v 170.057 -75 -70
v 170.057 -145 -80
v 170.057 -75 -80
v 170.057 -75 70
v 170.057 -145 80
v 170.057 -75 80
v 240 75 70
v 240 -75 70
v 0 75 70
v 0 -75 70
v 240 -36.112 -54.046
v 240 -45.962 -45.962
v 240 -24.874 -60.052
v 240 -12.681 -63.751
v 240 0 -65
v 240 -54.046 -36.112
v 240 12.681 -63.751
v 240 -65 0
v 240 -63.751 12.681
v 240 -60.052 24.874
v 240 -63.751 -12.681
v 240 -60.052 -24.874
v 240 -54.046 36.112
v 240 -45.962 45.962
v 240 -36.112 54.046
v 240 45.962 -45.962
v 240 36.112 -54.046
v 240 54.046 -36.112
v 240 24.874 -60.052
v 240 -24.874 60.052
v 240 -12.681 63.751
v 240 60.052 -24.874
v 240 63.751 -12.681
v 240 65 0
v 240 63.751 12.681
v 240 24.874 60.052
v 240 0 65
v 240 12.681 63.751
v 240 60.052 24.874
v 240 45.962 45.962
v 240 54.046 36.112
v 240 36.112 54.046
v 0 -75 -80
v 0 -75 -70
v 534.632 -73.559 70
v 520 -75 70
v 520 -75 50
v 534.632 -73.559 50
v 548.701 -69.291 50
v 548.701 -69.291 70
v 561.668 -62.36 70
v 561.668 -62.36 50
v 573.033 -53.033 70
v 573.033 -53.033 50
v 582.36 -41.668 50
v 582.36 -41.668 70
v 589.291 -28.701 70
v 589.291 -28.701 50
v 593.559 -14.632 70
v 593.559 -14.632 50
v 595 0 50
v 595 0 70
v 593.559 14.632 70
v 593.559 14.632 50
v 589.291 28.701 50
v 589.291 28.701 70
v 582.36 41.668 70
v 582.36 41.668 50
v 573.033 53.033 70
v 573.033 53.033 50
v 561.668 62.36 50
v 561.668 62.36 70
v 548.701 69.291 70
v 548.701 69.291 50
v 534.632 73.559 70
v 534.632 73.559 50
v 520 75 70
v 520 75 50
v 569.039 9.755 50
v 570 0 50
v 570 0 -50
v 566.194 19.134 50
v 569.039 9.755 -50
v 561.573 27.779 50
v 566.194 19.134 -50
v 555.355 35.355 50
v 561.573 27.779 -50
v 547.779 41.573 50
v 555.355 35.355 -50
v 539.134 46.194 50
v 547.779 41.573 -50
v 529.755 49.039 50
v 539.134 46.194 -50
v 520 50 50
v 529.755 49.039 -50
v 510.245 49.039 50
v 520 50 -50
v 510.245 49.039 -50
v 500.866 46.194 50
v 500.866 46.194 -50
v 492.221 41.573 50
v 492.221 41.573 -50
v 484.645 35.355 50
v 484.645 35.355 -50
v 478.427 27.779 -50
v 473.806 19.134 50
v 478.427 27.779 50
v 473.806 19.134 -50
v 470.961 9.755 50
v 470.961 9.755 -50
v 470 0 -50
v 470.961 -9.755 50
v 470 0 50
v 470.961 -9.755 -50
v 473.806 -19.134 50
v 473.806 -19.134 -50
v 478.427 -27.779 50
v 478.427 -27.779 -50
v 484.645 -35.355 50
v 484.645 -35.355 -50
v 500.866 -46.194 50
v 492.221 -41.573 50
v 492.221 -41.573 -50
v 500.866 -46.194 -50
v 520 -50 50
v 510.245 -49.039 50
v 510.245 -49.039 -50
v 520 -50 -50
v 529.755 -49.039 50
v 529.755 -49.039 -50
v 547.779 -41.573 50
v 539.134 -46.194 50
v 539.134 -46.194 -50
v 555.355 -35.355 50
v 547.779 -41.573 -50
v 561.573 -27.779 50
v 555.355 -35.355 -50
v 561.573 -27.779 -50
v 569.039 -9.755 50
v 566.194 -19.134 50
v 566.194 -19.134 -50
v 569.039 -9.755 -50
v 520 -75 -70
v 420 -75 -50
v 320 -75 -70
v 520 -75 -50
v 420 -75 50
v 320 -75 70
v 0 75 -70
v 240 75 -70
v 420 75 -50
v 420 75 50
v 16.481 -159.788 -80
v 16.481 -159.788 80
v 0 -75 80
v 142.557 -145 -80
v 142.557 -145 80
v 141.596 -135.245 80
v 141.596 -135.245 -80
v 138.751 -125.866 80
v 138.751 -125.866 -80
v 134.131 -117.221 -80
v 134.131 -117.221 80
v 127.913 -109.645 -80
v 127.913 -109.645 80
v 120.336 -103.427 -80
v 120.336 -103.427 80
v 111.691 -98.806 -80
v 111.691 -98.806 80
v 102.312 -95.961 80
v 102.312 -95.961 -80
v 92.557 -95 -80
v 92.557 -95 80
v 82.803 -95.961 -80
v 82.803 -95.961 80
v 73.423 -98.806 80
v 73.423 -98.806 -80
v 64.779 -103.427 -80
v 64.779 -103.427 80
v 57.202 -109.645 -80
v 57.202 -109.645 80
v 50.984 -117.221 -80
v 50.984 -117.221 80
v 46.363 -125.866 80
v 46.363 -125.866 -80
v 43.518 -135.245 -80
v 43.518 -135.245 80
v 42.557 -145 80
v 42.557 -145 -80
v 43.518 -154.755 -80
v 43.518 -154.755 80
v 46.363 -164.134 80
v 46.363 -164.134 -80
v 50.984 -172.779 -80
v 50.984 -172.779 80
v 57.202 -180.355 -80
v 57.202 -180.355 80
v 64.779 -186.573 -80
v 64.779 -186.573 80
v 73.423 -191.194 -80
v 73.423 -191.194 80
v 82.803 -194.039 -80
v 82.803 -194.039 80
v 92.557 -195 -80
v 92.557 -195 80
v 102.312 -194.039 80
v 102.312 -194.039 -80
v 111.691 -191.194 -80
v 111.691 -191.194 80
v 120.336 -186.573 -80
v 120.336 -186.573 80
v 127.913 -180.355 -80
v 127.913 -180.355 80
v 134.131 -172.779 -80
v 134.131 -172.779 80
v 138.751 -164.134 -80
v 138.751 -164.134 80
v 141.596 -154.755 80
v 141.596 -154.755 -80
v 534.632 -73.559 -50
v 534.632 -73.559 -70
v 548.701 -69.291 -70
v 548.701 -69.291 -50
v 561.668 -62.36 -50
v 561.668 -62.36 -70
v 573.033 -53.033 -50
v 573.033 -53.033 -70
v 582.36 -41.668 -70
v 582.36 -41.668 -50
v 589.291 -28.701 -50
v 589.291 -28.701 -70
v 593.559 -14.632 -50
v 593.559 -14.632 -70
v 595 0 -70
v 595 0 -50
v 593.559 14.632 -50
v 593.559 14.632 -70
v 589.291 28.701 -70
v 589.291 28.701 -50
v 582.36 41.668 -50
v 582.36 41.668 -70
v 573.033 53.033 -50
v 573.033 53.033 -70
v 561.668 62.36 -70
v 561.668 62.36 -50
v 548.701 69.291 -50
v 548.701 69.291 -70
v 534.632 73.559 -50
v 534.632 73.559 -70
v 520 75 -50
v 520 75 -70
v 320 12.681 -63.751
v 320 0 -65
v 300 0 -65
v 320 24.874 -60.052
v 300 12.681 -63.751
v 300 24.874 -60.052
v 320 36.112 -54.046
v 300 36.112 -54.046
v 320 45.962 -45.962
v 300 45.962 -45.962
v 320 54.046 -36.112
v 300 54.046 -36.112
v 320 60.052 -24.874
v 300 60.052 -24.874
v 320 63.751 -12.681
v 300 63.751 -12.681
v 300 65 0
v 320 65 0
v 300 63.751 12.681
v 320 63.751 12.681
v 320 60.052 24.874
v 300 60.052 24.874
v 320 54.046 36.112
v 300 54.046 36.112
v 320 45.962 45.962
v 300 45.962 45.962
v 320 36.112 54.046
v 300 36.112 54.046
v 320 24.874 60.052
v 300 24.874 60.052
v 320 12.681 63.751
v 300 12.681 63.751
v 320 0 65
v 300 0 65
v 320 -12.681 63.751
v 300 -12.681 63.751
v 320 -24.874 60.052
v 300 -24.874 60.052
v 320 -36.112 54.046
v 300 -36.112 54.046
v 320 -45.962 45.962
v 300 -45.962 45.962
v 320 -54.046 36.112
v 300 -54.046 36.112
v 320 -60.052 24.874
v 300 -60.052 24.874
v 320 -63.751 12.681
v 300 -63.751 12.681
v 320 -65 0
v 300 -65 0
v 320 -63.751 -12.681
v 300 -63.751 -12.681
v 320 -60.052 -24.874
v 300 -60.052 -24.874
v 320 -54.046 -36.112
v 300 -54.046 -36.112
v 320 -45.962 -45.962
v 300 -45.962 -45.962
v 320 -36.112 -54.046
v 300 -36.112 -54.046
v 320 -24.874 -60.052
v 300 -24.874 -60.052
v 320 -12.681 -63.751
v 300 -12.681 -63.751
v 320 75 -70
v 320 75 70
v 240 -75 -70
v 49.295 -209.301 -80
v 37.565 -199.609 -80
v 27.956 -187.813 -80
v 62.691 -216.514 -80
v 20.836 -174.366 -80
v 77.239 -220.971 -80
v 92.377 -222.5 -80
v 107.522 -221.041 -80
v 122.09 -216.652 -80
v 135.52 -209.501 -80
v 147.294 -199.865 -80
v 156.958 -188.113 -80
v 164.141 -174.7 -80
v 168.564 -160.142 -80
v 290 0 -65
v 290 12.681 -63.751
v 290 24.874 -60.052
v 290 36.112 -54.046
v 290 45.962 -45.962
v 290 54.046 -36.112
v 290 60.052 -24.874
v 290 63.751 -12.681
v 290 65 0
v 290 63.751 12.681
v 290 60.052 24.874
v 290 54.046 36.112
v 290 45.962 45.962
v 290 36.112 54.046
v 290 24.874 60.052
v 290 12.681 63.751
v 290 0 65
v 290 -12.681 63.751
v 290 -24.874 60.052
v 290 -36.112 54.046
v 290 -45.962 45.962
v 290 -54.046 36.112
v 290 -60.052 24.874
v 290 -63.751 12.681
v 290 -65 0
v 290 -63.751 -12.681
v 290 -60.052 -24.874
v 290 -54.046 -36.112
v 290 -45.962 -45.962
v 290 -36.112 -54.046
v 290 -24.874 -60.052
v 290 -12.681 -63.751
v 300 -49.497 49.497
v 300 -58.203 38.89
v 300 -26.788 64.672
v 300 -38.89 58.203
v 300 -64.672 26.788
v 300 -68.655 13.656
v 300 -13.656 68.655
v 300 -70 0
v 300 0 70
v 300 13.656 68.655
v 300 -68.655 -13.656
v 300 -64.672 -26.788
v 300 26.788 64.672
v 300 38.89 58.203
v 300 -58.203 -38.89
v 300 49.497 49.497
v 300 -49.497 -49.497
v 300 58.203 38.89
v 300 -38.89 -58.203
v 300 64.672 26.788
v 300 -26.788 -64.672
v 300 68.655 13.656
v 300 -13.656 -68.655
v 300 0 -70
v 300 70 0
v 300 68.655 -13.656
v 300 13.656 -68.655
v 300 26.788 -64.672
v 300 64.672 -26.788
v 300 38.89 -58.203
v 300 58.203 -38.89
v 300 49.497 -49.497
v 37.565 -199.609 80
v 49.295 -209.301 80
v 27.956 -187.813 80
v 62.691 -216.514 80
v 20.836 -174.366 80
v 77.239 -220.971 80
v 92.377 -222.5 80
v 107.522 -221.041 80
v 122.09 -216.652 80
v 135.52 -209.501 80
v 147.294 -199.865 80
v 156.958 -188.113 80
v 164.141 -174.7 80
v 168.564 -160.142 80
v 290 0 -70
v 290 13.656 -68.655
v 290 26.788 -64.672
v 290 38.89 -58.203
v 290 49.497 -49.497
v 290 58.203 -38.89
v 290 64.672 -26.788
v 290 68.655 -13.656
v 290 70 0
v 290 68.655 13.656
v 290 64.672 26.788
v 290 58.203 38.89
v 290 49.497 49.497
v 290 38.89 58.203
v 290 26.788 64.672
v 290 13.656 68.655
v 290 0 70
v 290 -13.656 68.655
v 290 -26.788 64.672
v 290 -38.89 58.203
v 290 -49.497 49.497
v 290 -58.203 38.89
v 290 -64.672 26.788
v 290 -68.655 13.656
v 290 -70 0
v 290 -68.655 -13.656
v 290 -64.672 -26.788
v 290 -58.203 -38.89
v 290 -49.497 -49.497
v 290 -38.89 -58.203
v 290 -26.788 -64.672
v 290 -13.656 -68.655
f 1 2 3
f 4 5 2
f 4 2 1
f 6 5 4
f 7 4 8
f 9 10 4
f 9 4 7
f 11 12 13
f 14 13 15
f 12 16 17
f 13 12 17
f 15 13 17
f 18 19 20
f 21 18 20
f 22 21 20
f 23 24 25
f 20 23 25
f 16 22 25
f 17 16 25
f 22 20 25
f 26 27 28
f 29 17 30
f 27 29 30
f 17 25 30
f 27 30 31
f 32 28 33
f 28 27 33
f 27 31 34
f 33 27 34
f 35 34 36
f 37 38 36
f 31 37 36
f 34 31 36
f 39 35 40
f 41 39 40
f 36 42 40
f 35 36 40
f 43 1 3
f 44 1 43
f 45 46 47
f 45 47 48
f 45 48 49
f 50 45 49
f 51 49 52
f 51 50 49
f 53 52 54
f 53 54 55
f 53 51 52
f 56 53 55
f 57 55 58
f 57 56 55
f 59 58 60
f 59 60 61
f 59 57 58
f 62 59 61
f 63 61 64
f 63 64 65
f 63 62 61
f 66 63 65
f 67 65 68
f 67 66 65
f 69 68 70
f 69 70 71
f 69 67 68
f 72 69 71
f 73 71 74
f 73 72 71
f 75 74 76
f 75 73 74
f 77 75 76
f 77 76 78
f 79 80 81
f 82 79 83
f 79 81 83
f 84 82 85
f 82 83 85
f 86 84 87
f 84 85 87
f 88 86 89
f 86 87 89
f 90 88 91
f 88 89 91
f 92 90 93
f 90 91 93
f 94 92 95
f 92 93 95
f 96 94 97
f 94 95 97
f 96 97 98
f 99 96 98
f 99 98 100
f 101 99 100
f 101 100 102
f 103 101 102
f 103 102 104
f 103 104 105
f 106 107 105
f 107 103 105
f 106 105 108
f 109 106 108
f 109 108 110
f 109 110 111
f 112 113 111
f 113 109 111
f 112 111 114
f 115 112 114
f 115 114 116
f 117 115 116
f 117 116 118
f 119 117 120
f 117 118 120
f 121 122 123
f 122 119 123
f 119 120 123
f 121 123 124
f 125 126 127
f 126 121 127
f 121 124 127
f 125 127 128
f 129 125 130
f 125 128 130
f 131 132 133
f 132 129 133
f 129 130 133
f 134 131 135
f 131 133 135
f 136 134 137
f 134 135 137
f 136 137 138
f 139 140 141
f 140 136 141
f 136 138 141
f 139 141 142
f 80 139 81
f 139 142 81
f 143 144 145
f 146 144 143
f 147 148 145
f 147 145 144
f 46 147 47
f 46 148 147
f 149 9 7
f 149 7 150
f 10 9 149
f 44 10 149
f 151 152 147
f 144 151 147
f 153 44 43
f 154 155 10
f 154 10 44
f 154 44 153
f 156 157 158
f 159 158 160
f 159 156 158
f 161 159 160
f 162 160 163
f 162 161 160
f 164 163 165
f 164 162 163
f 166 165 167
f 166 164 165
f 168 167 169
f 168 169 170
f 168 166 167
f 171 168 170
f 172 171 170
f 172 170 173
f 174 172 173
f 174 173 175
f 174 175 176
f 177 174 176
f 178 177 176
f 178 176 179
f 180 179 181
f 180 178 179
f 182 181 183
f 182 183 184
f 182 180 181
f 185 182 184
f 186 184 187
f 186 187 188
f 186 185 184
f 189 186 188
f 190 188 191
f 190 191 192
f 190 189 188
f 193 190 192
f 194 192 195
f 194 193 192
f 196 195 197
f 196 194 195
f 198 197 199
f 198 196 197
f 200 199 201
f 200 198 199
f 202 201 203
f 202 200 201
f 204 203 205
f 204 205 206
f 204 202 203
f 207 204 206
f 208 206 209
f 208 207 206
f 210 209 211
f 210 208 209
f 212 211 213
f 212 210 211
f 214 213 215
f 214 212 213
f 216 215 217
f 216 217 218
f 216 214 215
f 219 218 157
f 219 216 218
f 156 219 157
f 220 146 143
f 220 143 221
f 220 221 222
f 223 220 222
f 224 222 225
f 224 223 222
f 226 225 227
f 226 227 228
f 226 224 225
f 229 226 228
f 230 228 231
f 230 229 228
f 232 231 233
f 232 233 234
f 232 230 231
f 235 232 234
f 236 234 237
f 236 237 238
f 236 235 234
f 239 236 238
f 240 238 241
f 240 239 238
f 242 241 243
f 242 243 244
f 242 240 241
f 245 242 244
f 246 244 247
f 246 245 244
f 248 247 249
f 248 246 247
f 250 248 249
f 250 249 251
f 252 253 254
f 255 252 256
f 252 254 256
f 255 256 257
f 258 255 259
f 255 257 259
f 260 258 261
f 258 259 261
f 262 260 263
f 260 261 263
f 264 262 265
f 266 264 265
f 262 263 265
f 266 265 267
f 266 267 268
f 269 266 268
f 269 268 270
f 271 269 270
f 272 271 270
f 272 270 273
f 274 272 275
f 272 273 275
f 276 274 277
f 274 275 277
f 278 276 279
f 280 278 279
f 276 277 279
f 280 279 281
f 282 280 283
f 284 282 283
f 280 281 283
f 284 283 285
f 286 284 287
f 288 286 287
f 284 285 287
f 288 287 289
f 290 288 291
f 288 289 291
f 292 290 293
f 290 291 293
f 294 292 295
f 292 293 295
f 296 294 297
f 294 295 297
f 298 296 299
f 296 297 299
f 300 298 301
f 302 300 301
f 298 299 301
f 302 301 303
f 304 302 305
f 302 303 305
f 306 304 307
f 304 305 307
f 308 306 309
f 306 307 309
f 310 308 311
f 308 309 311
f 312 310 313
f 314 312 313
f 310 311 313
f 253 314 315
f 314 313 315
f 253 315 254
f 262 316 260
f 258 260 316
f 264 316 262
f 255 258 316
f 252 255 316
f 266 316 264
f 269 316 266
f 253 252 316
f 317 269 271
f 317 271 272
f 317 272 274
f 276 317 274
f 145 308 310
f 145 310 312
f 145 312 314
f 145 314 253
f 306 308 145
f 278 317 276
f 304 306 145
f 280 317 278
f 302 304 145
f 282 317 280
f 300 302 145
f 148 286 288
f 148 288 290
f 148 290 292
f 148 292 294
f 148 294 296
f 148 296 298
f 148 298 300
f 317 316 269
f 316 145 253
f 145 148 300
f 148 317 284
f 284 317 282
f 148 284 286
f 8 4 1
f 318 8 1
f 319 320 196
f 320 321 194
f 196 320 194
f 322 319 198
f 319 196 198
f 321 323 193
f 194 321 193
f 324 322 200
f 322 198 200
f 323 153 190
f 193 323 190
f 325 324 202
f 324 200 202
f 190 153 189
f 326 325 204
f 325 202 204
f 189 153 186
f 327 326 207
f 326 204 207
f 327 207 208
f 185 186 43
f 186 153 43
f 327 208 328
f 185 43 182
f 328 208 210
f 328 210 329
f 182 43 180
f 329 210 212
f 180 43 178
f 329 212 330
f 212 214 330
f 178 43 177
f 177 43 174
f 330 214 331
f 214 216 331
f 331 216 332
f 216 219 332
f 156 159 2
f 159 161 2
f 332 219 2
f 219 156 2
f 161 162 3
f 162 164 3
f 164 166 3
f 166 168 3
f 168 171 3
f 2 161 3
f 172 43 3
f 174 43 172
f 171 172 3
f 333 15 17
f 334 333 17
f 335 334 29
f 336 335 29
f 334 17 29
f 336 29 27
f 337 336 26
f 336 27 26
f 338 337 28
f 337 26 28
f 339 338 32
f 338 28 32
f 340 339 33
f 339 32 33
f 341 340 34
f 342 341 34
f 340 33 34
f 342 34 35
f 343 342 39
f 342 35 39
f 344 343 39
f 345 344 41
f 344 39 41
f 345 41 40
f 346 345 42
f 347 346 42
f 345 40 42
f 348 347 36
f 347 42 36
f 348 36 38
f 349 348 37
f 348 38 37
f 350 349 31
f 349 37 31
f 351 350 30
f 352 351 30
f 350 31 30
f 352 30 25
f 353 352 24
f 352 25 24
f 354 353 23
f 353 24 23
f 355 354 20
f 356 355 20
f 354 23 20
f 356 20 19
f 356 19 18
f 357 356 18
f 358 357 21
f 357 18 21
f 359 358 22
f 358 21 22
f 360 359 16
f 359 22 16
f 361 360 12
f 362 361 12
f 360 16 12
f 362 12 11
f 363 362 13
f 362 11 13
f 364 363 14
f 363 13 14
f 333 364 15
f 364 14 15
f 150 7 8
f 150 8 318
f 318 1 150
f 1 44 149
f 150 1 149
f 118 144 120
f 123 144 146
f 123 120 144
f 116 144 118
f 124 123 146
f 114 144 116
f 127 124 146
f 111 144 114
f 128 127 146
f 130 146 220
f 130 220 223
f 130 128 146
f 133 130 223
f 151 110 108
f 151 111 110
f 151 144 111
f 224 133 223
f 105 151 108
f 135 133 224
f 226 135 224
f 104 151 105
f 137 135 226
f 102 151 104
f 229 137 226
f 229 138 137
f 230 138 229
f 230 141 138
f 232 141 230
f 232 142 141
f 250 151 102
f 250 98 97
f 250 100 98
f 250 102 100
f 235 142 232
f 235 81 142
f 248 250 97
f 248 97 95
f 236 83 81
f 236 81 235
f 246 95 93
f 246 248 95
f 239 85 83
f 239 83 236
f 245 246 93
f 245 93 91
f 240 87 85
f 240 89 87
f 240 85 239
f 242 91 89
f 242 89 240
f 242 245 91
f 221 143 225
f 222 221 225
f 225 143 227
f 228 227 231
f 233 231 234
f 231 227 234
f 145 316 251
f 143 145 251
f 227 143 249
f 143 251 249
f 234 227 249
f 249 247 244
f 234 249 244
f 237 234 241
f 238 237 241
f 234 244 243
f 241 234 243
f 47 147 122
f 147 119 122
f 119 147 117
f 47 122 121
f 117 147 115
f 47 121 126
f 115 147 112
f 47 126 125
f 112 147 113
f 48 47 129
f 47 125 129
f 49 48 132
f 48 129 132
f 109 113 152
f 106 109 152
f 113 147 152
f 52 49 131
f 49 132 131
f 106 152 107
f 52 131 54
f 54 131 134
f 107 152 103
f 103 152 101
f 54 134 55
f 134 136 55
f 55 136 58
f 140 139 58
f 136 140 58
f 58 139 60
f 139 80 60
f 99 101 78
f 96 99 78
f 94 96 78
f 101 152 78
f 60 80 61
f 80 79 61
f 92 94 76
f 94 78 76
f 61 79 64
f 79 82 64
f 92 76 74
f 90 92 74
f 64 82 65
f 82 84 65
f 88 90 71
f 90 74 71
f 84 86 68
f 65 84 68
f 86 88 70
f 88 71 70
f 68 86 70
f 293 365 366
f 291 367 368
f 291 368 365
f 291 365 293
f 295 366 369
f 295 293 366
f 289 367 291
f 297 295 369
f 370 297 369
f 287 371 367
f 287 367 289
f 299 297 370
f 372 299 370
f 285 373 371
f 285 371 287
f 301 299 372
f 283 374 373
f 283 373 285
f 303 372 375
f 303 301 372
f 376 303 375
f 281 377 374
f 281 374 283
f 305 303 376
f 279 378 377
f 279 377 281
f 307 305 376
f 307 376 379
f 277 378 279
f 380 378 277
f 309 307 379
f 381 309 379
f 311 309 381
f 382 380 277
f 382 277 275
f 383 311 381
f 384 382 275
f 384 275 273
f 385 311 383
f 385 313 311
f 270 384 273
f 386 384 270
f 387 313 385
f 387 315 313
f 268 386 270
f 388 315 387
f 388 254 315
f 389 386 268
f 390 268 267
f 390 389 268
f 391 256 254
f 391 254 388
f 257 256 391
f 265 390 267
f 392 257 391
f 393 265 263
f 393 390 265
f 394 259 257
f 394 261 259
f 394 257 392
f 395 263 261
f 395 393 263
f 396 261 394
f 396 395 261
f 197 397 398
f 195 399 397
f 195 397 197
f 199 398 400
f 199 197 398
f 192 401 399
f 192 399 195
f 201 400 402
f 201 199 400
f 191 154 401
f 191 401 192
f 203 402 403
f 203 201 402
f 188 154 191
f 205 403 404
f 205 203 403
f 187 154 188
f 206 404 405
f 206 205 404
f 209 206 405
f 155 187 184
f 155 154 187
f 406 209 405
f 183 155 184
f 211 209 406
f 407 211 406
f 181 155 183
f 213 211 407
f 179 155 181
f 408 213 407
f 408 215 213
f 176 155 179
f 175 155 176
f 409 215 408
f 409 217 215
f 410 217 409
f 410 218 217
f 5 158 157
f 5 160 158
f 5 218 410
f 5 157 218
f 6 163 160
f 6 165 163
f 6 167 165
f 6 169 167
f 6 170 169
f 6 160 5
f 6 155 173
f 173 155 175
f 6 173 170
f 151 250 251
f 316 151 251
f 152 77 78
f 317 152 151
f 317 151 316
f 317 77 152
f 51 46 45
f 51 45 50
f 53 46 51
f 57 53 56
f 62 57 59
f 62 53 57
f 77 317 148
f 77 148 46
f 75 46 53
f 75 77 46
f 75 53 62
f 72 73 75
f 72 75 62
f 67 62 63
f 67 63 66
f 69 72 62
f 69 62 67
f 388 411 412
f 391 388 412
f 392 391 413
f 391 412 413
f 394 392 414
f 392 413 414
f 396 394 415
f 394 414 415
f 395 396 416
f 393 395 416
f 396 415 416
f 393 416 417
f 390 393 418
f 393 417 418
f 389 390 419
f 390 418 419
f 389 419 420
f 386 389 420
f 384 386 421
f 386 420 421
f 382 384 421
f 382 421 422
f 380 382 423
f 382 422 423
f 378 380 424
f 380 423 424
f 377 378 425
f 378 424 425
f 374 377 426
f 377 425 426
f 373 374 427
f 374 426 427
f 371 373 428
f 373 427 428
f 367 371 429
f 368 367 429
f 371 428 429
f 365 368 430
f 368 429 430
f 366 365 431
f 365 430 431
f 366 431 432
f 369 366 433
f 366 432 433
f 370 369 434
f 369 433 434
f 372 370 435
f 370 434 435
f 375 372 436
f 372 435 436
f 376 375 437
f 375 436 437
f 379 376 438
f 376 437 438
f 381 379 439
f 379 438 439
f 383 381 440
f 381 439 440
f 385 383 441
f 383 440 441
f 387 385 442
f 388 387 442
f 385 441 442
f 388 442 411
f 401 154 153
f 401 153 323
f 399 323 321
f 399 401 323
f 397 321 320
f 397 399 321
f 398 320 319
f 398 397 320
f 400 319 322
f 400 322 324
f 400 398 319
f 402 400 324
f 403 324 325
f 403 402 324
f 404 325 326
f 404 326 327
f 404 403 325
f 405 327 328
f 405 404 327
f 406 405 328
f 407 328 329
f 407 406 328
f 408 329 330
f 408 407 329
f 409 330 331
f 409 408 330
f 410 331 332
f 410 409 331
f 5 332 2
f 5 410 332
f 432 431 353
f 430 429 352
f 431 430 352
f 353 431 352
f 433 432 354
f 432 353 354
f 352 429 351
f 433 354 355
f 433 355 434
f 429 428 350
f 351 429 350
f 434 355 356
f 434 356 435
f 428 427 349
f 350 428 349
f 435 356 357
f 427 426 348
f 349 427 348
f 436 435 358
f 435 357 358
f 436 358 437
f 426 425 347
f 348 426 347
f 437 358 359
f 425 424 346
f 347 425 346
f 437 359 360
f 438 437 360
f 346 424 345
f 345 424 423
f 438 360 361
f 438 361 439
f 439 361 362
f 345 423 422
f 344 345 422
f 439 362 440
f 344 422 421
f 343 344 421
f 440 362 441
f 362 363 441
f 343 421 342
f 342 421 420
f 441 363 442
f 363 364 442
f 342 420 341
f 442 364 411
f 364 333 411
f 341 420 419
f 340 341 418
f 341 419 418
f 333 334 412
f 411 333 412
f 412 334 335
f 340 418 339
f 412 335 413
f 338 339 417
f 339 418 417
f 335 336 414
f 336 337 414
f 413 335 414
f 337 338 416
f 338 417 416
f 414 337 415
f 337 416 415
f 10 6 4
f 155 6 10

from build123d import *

# Parameters (mm, degrees)
SKETCH1_W           = 140
SKETCH1_H           = 150
BOSS_EXTRUDE1_DEPTH = 240
SKETCH2_R           = 65
BOSS_EXTRUDE2_DEPTH = 50
SKETCH3_R           = 70
BOSS_EXTRUDE3_DEPTH = 10
SKETCH4_R           = 50
BOSS_EXTRUDE4_DEPTH = 80
SKETCH5_R           = 65
BOSS_EXTRUDE5_DEPTH = 20
BOSS_EXTRUDE6_DEPTH = 70
CUT_EXTRUDE1_DEPTH  = 50
BOSS_EXTRUDE7_REACH = 650.407
SKETCH8_R           = 50


with BuildPart() as part:
    # Sketch1 → Boss-Extrude1 (new body)
    with BuildSketch(Plane(origin=(0, 0, 0), x_dir=(0, 0, -1), z_dir=(1, 0, 0))):
        Rectangle(SKETCH1_W, SKETCH1_H)
    extrude(amount=BOSS_EXTRUDE1_DEPTH)

    # Sketch2 → Boss-Extrude2 (add)
    with BuildSketch(Plane(origin=(240, 0, 0), x_dir=(0, 0, -1), z_dir=(1, 0, 0))):
        Circle(SKETCH2_R)
    extrude(amount=BOSS_EXTRUDE2_DEPTH)

    # Sketch3 → Boss-Extrude3 (add)
    with BuildSketch(Plane(origin=(290, 0, 0), x_dir=(0, 0, -1), z_dir=(1, 0, 0))):
        Circle(SKETCH3_R)
    extrude(amount=BOSS_EXTRUDE3_DEPTH)

    # Sketch4 → Boss-Extrude4 (add, symmetric)
    with BuildSketch(Plane.XY):
        with BuildLine():
            Line((0, -75), (16.481058781, -159.787697142))
            ThreePointArc((16.481058781, -159.787697142), (99.985211319, -222.143205373), (170.057165499, -145))
            Line((170.057165499, -145), (170.057165499, -75))
            Line((170.057165499, -75), (0, -75))
        make_face()
        with Locations((92.557165499, -145)):
            Circle(SKETCH4_R, mode=Mode.SUBTRACT)
    extrude(amount=BOSS_EXTRUDE4_DEPTH, both=True)

    # Sketch5 → Boss-Extrude5 (add)
    with BuildSketch(Plane(origin=(300, 0, 0), x_dir=(0, 0, -1), z_dir=(1, 0, 0))):
        Circle(SKETCH5_R)
    extrude(amount=BOSS_EXTRUDE5_DEPTH)

    # Sketch6 → Boss-Extrude6 (add, symmetric)
    with BuildSketch(Plane.XY):
        with BuildLine():
            Line((520, 75), (320, 75))
            Line((320, 75), (320, -75))
            Line((320, -75), (520, -75))
            ThreePointArc((520, -75), (595, 0), (520, 75))
        make_face()
    extrude(amount=BOSS_EXTRUDE6_DEPTH, both=True)

    # Sketch7 → Cut-Extrude1 (cut, symmetric)
    with BuildSketch(Plane.XY):
        with BuildLine():
            Line((520, 75), (420, 75))
            Line((420, 75), (420, -75))
            Line((420, -75), (520, -75))
            ThreePointArc((520, -75), (595, 0), (520, 75))
        make_face()
    extrude(amount=CUT_EXTRUDE1_DEPTH, both=True, mode=Mode.SUBTRACT)

    # Sketch8 → Boss-Extrude7 (add, up to next)
    with BuildSketch(Plane.XY.offset(-50), mode=Mode.PRIVATE) as boss_extrude7_sk1:
        with Locations((520, 0)):
            Circle(SKETCH8_R)
    boss_extrude7_tool1 = extrude(boss_extrude7_sk1.sketch, amount=BOSS_EXTRUDE7_REACH, mode=Mode.PRIVATE) - part.part
    add(boss_extrude7_tool1.solids().sort_by_distance((520, 0, -50))[0])


with BuildPart() as body_2:
    # Split1: the piece on the far side of the plane
    add(part.part)
    split(bisect_by=Plane(origin=(240, 0, 0), x_dir=(0, 0, 1), z_dir=(1, 0, 0)), keep=Keep.BOTTOM)


with BuildPart() as part_1:
    add(part.part)

    # Split1
    split(bisect_by=Plane(origin=(240, 0, 0), x_dir=(0, 0, 1), z_dir=(1, 0, 0)), keep=Keep.TOP)


solid = Compound([body_2.part, part_1.part])
